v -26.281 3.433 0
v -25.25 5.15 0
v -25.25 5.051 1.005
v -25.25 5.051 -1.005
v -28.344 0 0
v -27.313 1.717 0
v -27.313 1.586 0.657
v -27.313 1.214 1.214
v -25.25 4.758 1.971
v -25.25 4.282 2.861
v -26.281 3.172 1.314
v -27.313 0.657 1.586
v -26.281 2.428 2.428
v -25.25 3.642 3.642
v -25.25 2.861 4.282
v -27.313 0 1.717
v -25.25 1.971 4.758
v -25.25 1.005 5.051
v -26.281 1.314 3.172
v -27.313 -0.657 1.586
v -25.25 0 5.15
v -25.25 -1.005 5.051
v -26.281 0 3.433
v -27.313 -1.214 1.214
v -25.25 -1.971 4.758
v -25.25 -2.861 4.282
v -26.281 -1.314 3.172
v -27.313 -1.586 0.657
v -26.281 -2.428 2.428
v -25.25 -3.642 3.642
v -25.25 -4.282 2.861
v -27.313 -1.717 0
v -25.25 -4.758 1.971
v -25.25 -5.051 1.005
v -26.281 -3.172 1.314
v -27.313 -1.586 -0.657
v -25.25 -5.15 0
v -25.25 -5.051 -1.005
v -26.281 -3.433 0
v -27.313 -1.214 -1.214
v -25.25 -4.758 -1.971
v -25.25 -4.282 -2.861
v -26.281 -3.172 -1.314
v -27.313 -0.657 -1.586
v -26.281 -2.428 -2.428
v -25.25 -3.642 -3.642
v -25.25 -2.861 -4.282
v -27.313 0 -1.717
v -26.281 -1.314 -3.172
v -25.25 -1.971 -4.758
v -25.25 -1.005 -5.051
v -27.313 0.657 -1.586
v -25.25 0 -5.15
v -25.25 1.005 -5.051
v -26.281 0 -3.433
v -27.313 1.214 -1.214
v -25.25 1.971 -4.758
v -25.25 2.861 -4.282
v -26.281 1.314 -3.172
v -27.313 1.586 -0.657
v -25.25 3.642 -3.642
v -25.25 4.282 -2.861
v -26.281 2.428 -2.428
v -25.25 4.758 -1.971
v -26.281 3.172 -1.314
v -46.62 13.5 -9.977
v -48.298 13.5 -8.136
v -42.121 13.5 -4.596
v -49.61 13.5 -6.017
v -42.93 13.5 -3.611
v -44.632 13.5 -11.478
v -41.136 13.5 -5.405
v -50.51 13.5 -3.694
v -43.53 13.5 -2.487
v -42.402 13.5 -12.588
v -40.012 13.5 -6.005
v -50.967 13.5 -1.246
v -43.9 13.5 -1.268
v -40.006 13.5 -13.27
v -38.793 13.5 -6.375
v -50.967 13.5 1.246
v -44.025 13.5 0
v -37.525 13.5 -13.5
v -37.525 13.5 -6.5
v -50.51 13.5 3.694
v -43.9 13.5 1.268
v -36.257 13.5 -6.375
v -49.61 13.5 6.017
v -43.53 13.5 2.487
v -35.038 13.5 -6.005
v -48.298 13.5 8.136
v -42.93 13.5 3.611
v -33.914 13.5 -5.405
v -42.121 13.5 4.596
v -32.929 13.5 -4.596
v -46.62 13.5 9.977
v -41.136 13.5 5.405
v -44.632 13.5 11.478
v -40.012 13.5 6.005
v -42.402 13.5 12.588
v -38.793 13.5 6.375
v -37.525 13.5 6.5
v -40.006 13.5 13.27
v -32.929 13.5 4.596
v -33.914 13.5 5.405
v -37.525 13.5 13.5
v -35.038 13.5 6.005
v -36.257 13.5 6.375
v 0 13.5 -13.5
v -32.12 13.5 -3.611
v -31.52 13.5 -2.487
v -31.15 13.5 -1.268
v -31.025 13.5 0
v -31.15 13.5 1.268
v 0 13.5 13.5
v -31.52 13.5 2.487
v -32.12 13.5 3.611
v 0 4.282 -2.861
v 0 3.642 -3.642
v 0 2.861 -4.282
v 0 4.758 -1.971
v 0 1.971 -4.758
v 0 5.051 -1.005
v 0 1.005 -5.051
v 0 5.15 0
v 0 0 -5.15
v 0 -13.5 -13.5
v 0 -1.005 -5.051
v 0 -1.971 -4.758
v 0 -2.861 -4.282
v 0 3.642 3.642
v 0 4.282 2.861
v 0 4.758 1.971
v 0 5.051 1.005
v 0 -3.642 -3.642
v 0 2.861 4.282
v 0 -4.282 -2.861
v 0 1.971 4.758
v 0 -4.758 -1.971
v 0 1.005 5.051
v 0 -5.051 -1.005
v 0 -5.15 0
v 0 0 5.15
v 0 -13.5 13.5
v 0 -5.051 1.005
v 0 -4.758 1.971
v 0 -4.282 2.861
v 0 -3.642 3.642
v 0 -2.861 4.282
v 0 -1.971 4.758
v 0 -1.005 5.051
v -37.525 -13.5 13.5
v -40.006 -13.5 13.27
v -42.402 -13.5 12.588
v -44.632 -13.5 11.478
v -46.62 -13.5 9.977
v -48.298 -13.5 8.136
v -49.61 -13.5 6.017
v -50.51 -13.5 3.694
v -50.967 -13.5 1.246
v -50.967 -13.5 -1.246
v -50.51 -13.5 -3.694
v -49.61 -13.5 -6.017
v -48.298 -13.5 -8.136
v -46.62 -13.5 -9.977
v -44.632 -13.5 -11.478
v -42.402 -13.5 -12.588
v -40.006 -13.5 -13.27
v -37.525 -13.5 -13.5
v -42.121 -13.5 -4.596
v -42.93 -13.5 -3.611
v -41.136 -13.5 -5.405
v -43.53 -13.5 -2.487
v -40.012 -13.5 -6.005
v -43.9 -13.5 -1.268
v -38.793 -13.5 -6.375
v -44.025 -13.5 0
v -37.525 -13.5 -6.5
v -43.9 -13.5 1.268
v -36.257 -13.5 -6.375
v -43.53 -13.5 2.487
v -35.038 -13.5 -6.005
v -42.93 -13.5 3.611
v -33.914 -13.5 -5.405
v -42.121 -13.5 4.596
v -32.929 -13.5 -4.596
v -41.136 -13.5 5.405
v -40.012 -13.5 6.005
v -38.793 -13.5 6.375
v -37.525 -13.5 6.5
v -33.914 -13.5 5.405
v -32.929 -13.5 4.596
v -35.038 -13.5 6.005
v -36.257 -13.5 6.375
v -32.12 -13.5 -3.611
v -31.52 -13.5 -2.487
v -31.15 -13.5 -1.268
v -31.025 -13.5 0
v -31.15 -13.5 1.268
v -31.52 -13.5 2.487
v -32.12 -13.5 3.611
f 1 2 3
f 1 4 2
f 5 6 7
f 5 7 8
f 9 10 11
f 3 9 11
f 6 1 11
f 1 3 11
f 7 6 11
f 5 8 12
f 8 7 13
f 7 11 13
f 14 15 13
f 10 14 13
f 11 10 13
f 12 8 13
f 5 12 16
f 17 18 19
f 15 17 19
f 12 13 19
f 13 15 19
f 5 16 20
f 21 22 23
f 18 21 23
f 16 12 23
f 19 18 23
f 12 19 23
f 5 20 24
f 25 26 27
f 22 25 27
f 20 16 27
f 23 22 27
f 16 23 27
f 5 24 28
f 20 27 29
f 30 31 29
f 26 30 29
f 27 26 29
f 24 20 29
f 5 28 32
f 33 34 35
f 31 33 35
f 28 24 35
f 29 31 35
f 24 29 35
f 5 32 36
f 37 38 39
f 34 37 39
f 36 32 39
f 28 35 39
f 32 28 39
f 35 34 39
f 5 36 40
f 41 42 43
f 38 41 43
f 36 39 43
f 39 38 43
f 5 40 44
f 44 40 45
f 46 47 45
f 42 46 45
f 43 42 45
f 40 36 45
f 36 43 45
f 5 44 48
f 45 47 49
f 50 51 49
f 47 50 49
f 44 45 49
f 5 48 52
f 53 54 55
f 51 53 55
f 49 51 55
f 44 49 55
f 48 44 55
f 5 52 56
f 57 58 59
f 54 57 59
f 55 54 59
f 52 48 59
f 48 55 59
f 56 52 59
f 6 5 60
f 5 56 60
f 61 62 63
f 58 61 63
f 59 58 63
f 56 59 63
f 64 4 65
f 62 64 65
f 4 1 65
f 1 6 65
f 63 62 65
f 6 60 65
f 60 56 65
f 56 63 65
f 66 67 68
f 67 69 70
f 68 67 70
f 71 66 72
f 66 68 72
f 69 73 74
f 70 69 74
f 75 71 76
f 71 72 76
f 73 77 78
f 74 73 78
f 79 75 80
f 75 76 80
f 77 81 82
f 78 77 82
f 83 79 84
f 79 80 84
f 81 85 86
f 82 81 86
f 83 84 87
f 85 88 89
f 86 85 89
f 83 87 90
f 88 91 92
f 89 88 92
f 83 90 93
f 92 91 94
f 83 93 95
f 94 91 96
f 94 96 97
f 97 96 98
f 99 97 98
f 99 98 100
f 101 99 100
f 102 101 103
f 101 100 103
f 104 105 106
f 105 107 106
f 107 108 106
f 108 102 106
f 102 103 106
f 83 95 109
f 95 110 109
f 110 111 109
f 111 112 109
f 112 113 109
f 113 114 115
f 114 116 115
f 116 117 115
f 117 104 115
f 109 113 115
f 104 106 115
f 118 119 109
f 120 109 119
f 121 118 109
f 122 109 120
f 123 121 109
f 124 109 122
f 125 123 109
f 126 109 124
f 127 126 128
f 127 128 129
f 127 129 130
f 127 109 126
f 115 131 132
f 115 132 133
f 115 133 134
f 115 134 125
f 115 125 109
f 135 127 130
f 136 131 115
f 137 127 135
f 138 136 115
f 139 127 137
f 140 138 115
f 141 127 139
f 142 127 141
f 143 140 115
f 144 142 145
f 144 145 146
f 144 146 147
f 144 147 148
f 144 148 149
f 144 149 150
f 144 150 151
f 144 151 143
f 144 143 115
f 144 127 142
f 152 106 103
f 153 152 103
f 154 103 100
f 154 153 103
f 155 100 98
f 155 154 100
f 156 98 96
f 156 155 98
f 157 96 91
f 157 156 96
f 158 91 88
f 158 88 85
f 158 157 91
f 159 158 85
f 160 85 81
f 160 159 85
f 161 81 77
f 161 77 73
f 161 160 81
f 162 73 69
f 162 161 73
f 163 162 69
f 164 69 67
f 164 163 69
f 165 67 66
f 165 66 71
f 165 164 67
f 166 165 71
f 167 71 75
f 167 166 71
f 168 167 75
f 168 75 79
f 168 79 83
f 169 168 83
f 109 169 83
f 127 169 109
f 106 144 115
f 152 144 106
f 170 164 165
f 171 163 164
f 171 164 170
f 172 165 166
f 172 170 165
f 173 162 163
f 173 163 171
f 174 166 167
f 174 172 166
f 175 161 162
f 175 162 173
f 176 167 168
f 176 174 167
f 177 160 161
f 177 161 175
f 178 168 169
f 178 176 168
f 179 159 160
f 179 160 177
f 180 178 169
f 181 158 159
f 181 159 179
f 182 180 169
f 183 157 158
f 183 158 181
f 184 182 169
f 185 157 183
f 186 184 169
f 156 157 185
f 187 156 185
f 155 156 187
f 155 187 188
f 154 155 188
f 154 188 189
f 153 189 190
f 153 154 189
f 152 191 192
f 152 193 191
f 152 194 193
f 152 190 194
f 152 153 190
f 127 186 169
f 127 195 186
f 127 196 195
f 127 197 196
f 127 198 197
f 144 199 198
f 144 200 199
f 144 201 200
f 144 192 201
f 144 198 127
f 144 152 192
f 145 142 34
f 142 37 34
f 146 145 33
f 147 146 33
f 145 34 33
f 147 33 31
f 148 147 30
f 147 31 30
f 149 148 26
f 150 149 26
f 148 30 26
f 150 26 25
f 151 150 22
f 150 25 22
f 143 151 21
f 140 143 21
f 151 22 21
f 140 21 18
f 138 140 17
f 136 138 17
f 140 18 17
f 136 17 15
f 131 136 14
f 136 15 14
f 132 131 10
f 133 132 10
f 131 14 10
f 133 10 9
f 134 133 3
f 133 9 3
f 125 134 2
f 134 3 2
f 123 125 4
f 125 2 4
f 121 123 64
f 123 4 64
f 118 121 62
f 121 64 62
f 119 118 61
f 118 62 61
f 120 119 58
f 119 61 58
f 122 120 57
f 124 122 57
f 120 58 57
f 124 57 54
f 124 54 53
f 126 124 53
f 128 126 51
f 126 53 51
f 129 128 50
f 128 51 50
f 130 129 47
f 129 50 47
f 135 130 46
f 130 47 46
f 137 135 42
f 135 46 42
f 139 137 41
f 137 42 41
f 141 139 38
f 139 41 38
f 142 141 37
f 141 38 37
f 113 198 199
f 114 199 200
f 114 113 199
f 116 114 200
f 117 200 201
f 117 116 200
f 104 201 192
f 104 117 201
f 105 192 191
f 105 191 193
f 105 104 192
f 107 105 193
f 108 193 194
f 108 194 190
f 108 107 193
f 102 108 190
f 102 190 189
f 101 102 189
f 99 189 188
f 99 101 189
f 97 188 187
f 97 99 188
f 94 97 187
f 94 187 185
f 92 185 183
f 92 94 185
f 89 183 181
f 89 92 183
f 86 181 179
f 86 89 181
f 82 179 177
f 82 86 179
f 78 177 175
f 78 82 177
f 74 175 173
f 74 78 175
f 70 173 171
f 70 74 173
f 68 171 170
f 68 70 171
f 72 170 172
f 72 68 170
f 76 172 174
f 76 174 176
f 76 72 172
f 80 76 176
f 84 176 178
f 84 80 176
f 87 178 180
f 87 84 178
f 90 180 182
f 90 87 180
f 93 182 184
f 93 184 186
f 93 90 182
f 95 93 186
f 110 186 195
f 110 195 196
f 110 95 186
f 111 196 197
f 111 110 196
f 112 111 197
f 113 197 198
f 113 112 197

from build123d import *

# Parameters (mm, degrees)
F0_R     = 6.5
F1_DEPTH = 13.5
F3_D     = 10.3
F3_DEPTH = 25.25
F3_TIP   = 3.094432188


with BuildPart() as f1:
    # F0 (on Front) → F1 (new body, symmetric)
    with BuildSketch(Plane.XZ):
        with BuildLine():
            ThreePointArc((-37.525, -13.5), (-27.979058454, -9.545941546), (-24.025, 0))
            ThreePointArc((-24.025, 0), (-27.979058454, 9.545941546), (-37.525, 13.5))
            ThreePointArc((-37.525, 13.5), (-51.025, 0), (-37.525, -13.5))
        make_face()
        with Locations((-37.525, 0)):
            Circle(F0_R, mode=Mode.SUBTRACT)
        with BuildLine():
            ThreePointArc((-37.525, 13.5), (-27.979058454, 9.545941546), (-24.025, 0))
            ThreePointArc((-24.025, 0), (-27.979058454, -9.545941546), (-37.525, -13.5))
            Line((-37.525, -13.5), (0, -13.5))
            Line((0, -13.5), (0, 13.5))
            Line((0, 13.5), (-37.525, 13.5))
        make_face()
    extrude(amount=F1_DEPTH, both=True)

    # F3
    with Locations(Plane.YZ):
        with Locations((0, 0)):
            Hole(F3_D / 2, depth=F3_DEPTH)
            with Locations((0, 0, -(F3_DEPTH + F3_TIP / 2))):  # 118° drill point
                Cone(0, F3_D / 2, F3_TIP, mode=Mode.SUBTRACT)


solid = f1.part
